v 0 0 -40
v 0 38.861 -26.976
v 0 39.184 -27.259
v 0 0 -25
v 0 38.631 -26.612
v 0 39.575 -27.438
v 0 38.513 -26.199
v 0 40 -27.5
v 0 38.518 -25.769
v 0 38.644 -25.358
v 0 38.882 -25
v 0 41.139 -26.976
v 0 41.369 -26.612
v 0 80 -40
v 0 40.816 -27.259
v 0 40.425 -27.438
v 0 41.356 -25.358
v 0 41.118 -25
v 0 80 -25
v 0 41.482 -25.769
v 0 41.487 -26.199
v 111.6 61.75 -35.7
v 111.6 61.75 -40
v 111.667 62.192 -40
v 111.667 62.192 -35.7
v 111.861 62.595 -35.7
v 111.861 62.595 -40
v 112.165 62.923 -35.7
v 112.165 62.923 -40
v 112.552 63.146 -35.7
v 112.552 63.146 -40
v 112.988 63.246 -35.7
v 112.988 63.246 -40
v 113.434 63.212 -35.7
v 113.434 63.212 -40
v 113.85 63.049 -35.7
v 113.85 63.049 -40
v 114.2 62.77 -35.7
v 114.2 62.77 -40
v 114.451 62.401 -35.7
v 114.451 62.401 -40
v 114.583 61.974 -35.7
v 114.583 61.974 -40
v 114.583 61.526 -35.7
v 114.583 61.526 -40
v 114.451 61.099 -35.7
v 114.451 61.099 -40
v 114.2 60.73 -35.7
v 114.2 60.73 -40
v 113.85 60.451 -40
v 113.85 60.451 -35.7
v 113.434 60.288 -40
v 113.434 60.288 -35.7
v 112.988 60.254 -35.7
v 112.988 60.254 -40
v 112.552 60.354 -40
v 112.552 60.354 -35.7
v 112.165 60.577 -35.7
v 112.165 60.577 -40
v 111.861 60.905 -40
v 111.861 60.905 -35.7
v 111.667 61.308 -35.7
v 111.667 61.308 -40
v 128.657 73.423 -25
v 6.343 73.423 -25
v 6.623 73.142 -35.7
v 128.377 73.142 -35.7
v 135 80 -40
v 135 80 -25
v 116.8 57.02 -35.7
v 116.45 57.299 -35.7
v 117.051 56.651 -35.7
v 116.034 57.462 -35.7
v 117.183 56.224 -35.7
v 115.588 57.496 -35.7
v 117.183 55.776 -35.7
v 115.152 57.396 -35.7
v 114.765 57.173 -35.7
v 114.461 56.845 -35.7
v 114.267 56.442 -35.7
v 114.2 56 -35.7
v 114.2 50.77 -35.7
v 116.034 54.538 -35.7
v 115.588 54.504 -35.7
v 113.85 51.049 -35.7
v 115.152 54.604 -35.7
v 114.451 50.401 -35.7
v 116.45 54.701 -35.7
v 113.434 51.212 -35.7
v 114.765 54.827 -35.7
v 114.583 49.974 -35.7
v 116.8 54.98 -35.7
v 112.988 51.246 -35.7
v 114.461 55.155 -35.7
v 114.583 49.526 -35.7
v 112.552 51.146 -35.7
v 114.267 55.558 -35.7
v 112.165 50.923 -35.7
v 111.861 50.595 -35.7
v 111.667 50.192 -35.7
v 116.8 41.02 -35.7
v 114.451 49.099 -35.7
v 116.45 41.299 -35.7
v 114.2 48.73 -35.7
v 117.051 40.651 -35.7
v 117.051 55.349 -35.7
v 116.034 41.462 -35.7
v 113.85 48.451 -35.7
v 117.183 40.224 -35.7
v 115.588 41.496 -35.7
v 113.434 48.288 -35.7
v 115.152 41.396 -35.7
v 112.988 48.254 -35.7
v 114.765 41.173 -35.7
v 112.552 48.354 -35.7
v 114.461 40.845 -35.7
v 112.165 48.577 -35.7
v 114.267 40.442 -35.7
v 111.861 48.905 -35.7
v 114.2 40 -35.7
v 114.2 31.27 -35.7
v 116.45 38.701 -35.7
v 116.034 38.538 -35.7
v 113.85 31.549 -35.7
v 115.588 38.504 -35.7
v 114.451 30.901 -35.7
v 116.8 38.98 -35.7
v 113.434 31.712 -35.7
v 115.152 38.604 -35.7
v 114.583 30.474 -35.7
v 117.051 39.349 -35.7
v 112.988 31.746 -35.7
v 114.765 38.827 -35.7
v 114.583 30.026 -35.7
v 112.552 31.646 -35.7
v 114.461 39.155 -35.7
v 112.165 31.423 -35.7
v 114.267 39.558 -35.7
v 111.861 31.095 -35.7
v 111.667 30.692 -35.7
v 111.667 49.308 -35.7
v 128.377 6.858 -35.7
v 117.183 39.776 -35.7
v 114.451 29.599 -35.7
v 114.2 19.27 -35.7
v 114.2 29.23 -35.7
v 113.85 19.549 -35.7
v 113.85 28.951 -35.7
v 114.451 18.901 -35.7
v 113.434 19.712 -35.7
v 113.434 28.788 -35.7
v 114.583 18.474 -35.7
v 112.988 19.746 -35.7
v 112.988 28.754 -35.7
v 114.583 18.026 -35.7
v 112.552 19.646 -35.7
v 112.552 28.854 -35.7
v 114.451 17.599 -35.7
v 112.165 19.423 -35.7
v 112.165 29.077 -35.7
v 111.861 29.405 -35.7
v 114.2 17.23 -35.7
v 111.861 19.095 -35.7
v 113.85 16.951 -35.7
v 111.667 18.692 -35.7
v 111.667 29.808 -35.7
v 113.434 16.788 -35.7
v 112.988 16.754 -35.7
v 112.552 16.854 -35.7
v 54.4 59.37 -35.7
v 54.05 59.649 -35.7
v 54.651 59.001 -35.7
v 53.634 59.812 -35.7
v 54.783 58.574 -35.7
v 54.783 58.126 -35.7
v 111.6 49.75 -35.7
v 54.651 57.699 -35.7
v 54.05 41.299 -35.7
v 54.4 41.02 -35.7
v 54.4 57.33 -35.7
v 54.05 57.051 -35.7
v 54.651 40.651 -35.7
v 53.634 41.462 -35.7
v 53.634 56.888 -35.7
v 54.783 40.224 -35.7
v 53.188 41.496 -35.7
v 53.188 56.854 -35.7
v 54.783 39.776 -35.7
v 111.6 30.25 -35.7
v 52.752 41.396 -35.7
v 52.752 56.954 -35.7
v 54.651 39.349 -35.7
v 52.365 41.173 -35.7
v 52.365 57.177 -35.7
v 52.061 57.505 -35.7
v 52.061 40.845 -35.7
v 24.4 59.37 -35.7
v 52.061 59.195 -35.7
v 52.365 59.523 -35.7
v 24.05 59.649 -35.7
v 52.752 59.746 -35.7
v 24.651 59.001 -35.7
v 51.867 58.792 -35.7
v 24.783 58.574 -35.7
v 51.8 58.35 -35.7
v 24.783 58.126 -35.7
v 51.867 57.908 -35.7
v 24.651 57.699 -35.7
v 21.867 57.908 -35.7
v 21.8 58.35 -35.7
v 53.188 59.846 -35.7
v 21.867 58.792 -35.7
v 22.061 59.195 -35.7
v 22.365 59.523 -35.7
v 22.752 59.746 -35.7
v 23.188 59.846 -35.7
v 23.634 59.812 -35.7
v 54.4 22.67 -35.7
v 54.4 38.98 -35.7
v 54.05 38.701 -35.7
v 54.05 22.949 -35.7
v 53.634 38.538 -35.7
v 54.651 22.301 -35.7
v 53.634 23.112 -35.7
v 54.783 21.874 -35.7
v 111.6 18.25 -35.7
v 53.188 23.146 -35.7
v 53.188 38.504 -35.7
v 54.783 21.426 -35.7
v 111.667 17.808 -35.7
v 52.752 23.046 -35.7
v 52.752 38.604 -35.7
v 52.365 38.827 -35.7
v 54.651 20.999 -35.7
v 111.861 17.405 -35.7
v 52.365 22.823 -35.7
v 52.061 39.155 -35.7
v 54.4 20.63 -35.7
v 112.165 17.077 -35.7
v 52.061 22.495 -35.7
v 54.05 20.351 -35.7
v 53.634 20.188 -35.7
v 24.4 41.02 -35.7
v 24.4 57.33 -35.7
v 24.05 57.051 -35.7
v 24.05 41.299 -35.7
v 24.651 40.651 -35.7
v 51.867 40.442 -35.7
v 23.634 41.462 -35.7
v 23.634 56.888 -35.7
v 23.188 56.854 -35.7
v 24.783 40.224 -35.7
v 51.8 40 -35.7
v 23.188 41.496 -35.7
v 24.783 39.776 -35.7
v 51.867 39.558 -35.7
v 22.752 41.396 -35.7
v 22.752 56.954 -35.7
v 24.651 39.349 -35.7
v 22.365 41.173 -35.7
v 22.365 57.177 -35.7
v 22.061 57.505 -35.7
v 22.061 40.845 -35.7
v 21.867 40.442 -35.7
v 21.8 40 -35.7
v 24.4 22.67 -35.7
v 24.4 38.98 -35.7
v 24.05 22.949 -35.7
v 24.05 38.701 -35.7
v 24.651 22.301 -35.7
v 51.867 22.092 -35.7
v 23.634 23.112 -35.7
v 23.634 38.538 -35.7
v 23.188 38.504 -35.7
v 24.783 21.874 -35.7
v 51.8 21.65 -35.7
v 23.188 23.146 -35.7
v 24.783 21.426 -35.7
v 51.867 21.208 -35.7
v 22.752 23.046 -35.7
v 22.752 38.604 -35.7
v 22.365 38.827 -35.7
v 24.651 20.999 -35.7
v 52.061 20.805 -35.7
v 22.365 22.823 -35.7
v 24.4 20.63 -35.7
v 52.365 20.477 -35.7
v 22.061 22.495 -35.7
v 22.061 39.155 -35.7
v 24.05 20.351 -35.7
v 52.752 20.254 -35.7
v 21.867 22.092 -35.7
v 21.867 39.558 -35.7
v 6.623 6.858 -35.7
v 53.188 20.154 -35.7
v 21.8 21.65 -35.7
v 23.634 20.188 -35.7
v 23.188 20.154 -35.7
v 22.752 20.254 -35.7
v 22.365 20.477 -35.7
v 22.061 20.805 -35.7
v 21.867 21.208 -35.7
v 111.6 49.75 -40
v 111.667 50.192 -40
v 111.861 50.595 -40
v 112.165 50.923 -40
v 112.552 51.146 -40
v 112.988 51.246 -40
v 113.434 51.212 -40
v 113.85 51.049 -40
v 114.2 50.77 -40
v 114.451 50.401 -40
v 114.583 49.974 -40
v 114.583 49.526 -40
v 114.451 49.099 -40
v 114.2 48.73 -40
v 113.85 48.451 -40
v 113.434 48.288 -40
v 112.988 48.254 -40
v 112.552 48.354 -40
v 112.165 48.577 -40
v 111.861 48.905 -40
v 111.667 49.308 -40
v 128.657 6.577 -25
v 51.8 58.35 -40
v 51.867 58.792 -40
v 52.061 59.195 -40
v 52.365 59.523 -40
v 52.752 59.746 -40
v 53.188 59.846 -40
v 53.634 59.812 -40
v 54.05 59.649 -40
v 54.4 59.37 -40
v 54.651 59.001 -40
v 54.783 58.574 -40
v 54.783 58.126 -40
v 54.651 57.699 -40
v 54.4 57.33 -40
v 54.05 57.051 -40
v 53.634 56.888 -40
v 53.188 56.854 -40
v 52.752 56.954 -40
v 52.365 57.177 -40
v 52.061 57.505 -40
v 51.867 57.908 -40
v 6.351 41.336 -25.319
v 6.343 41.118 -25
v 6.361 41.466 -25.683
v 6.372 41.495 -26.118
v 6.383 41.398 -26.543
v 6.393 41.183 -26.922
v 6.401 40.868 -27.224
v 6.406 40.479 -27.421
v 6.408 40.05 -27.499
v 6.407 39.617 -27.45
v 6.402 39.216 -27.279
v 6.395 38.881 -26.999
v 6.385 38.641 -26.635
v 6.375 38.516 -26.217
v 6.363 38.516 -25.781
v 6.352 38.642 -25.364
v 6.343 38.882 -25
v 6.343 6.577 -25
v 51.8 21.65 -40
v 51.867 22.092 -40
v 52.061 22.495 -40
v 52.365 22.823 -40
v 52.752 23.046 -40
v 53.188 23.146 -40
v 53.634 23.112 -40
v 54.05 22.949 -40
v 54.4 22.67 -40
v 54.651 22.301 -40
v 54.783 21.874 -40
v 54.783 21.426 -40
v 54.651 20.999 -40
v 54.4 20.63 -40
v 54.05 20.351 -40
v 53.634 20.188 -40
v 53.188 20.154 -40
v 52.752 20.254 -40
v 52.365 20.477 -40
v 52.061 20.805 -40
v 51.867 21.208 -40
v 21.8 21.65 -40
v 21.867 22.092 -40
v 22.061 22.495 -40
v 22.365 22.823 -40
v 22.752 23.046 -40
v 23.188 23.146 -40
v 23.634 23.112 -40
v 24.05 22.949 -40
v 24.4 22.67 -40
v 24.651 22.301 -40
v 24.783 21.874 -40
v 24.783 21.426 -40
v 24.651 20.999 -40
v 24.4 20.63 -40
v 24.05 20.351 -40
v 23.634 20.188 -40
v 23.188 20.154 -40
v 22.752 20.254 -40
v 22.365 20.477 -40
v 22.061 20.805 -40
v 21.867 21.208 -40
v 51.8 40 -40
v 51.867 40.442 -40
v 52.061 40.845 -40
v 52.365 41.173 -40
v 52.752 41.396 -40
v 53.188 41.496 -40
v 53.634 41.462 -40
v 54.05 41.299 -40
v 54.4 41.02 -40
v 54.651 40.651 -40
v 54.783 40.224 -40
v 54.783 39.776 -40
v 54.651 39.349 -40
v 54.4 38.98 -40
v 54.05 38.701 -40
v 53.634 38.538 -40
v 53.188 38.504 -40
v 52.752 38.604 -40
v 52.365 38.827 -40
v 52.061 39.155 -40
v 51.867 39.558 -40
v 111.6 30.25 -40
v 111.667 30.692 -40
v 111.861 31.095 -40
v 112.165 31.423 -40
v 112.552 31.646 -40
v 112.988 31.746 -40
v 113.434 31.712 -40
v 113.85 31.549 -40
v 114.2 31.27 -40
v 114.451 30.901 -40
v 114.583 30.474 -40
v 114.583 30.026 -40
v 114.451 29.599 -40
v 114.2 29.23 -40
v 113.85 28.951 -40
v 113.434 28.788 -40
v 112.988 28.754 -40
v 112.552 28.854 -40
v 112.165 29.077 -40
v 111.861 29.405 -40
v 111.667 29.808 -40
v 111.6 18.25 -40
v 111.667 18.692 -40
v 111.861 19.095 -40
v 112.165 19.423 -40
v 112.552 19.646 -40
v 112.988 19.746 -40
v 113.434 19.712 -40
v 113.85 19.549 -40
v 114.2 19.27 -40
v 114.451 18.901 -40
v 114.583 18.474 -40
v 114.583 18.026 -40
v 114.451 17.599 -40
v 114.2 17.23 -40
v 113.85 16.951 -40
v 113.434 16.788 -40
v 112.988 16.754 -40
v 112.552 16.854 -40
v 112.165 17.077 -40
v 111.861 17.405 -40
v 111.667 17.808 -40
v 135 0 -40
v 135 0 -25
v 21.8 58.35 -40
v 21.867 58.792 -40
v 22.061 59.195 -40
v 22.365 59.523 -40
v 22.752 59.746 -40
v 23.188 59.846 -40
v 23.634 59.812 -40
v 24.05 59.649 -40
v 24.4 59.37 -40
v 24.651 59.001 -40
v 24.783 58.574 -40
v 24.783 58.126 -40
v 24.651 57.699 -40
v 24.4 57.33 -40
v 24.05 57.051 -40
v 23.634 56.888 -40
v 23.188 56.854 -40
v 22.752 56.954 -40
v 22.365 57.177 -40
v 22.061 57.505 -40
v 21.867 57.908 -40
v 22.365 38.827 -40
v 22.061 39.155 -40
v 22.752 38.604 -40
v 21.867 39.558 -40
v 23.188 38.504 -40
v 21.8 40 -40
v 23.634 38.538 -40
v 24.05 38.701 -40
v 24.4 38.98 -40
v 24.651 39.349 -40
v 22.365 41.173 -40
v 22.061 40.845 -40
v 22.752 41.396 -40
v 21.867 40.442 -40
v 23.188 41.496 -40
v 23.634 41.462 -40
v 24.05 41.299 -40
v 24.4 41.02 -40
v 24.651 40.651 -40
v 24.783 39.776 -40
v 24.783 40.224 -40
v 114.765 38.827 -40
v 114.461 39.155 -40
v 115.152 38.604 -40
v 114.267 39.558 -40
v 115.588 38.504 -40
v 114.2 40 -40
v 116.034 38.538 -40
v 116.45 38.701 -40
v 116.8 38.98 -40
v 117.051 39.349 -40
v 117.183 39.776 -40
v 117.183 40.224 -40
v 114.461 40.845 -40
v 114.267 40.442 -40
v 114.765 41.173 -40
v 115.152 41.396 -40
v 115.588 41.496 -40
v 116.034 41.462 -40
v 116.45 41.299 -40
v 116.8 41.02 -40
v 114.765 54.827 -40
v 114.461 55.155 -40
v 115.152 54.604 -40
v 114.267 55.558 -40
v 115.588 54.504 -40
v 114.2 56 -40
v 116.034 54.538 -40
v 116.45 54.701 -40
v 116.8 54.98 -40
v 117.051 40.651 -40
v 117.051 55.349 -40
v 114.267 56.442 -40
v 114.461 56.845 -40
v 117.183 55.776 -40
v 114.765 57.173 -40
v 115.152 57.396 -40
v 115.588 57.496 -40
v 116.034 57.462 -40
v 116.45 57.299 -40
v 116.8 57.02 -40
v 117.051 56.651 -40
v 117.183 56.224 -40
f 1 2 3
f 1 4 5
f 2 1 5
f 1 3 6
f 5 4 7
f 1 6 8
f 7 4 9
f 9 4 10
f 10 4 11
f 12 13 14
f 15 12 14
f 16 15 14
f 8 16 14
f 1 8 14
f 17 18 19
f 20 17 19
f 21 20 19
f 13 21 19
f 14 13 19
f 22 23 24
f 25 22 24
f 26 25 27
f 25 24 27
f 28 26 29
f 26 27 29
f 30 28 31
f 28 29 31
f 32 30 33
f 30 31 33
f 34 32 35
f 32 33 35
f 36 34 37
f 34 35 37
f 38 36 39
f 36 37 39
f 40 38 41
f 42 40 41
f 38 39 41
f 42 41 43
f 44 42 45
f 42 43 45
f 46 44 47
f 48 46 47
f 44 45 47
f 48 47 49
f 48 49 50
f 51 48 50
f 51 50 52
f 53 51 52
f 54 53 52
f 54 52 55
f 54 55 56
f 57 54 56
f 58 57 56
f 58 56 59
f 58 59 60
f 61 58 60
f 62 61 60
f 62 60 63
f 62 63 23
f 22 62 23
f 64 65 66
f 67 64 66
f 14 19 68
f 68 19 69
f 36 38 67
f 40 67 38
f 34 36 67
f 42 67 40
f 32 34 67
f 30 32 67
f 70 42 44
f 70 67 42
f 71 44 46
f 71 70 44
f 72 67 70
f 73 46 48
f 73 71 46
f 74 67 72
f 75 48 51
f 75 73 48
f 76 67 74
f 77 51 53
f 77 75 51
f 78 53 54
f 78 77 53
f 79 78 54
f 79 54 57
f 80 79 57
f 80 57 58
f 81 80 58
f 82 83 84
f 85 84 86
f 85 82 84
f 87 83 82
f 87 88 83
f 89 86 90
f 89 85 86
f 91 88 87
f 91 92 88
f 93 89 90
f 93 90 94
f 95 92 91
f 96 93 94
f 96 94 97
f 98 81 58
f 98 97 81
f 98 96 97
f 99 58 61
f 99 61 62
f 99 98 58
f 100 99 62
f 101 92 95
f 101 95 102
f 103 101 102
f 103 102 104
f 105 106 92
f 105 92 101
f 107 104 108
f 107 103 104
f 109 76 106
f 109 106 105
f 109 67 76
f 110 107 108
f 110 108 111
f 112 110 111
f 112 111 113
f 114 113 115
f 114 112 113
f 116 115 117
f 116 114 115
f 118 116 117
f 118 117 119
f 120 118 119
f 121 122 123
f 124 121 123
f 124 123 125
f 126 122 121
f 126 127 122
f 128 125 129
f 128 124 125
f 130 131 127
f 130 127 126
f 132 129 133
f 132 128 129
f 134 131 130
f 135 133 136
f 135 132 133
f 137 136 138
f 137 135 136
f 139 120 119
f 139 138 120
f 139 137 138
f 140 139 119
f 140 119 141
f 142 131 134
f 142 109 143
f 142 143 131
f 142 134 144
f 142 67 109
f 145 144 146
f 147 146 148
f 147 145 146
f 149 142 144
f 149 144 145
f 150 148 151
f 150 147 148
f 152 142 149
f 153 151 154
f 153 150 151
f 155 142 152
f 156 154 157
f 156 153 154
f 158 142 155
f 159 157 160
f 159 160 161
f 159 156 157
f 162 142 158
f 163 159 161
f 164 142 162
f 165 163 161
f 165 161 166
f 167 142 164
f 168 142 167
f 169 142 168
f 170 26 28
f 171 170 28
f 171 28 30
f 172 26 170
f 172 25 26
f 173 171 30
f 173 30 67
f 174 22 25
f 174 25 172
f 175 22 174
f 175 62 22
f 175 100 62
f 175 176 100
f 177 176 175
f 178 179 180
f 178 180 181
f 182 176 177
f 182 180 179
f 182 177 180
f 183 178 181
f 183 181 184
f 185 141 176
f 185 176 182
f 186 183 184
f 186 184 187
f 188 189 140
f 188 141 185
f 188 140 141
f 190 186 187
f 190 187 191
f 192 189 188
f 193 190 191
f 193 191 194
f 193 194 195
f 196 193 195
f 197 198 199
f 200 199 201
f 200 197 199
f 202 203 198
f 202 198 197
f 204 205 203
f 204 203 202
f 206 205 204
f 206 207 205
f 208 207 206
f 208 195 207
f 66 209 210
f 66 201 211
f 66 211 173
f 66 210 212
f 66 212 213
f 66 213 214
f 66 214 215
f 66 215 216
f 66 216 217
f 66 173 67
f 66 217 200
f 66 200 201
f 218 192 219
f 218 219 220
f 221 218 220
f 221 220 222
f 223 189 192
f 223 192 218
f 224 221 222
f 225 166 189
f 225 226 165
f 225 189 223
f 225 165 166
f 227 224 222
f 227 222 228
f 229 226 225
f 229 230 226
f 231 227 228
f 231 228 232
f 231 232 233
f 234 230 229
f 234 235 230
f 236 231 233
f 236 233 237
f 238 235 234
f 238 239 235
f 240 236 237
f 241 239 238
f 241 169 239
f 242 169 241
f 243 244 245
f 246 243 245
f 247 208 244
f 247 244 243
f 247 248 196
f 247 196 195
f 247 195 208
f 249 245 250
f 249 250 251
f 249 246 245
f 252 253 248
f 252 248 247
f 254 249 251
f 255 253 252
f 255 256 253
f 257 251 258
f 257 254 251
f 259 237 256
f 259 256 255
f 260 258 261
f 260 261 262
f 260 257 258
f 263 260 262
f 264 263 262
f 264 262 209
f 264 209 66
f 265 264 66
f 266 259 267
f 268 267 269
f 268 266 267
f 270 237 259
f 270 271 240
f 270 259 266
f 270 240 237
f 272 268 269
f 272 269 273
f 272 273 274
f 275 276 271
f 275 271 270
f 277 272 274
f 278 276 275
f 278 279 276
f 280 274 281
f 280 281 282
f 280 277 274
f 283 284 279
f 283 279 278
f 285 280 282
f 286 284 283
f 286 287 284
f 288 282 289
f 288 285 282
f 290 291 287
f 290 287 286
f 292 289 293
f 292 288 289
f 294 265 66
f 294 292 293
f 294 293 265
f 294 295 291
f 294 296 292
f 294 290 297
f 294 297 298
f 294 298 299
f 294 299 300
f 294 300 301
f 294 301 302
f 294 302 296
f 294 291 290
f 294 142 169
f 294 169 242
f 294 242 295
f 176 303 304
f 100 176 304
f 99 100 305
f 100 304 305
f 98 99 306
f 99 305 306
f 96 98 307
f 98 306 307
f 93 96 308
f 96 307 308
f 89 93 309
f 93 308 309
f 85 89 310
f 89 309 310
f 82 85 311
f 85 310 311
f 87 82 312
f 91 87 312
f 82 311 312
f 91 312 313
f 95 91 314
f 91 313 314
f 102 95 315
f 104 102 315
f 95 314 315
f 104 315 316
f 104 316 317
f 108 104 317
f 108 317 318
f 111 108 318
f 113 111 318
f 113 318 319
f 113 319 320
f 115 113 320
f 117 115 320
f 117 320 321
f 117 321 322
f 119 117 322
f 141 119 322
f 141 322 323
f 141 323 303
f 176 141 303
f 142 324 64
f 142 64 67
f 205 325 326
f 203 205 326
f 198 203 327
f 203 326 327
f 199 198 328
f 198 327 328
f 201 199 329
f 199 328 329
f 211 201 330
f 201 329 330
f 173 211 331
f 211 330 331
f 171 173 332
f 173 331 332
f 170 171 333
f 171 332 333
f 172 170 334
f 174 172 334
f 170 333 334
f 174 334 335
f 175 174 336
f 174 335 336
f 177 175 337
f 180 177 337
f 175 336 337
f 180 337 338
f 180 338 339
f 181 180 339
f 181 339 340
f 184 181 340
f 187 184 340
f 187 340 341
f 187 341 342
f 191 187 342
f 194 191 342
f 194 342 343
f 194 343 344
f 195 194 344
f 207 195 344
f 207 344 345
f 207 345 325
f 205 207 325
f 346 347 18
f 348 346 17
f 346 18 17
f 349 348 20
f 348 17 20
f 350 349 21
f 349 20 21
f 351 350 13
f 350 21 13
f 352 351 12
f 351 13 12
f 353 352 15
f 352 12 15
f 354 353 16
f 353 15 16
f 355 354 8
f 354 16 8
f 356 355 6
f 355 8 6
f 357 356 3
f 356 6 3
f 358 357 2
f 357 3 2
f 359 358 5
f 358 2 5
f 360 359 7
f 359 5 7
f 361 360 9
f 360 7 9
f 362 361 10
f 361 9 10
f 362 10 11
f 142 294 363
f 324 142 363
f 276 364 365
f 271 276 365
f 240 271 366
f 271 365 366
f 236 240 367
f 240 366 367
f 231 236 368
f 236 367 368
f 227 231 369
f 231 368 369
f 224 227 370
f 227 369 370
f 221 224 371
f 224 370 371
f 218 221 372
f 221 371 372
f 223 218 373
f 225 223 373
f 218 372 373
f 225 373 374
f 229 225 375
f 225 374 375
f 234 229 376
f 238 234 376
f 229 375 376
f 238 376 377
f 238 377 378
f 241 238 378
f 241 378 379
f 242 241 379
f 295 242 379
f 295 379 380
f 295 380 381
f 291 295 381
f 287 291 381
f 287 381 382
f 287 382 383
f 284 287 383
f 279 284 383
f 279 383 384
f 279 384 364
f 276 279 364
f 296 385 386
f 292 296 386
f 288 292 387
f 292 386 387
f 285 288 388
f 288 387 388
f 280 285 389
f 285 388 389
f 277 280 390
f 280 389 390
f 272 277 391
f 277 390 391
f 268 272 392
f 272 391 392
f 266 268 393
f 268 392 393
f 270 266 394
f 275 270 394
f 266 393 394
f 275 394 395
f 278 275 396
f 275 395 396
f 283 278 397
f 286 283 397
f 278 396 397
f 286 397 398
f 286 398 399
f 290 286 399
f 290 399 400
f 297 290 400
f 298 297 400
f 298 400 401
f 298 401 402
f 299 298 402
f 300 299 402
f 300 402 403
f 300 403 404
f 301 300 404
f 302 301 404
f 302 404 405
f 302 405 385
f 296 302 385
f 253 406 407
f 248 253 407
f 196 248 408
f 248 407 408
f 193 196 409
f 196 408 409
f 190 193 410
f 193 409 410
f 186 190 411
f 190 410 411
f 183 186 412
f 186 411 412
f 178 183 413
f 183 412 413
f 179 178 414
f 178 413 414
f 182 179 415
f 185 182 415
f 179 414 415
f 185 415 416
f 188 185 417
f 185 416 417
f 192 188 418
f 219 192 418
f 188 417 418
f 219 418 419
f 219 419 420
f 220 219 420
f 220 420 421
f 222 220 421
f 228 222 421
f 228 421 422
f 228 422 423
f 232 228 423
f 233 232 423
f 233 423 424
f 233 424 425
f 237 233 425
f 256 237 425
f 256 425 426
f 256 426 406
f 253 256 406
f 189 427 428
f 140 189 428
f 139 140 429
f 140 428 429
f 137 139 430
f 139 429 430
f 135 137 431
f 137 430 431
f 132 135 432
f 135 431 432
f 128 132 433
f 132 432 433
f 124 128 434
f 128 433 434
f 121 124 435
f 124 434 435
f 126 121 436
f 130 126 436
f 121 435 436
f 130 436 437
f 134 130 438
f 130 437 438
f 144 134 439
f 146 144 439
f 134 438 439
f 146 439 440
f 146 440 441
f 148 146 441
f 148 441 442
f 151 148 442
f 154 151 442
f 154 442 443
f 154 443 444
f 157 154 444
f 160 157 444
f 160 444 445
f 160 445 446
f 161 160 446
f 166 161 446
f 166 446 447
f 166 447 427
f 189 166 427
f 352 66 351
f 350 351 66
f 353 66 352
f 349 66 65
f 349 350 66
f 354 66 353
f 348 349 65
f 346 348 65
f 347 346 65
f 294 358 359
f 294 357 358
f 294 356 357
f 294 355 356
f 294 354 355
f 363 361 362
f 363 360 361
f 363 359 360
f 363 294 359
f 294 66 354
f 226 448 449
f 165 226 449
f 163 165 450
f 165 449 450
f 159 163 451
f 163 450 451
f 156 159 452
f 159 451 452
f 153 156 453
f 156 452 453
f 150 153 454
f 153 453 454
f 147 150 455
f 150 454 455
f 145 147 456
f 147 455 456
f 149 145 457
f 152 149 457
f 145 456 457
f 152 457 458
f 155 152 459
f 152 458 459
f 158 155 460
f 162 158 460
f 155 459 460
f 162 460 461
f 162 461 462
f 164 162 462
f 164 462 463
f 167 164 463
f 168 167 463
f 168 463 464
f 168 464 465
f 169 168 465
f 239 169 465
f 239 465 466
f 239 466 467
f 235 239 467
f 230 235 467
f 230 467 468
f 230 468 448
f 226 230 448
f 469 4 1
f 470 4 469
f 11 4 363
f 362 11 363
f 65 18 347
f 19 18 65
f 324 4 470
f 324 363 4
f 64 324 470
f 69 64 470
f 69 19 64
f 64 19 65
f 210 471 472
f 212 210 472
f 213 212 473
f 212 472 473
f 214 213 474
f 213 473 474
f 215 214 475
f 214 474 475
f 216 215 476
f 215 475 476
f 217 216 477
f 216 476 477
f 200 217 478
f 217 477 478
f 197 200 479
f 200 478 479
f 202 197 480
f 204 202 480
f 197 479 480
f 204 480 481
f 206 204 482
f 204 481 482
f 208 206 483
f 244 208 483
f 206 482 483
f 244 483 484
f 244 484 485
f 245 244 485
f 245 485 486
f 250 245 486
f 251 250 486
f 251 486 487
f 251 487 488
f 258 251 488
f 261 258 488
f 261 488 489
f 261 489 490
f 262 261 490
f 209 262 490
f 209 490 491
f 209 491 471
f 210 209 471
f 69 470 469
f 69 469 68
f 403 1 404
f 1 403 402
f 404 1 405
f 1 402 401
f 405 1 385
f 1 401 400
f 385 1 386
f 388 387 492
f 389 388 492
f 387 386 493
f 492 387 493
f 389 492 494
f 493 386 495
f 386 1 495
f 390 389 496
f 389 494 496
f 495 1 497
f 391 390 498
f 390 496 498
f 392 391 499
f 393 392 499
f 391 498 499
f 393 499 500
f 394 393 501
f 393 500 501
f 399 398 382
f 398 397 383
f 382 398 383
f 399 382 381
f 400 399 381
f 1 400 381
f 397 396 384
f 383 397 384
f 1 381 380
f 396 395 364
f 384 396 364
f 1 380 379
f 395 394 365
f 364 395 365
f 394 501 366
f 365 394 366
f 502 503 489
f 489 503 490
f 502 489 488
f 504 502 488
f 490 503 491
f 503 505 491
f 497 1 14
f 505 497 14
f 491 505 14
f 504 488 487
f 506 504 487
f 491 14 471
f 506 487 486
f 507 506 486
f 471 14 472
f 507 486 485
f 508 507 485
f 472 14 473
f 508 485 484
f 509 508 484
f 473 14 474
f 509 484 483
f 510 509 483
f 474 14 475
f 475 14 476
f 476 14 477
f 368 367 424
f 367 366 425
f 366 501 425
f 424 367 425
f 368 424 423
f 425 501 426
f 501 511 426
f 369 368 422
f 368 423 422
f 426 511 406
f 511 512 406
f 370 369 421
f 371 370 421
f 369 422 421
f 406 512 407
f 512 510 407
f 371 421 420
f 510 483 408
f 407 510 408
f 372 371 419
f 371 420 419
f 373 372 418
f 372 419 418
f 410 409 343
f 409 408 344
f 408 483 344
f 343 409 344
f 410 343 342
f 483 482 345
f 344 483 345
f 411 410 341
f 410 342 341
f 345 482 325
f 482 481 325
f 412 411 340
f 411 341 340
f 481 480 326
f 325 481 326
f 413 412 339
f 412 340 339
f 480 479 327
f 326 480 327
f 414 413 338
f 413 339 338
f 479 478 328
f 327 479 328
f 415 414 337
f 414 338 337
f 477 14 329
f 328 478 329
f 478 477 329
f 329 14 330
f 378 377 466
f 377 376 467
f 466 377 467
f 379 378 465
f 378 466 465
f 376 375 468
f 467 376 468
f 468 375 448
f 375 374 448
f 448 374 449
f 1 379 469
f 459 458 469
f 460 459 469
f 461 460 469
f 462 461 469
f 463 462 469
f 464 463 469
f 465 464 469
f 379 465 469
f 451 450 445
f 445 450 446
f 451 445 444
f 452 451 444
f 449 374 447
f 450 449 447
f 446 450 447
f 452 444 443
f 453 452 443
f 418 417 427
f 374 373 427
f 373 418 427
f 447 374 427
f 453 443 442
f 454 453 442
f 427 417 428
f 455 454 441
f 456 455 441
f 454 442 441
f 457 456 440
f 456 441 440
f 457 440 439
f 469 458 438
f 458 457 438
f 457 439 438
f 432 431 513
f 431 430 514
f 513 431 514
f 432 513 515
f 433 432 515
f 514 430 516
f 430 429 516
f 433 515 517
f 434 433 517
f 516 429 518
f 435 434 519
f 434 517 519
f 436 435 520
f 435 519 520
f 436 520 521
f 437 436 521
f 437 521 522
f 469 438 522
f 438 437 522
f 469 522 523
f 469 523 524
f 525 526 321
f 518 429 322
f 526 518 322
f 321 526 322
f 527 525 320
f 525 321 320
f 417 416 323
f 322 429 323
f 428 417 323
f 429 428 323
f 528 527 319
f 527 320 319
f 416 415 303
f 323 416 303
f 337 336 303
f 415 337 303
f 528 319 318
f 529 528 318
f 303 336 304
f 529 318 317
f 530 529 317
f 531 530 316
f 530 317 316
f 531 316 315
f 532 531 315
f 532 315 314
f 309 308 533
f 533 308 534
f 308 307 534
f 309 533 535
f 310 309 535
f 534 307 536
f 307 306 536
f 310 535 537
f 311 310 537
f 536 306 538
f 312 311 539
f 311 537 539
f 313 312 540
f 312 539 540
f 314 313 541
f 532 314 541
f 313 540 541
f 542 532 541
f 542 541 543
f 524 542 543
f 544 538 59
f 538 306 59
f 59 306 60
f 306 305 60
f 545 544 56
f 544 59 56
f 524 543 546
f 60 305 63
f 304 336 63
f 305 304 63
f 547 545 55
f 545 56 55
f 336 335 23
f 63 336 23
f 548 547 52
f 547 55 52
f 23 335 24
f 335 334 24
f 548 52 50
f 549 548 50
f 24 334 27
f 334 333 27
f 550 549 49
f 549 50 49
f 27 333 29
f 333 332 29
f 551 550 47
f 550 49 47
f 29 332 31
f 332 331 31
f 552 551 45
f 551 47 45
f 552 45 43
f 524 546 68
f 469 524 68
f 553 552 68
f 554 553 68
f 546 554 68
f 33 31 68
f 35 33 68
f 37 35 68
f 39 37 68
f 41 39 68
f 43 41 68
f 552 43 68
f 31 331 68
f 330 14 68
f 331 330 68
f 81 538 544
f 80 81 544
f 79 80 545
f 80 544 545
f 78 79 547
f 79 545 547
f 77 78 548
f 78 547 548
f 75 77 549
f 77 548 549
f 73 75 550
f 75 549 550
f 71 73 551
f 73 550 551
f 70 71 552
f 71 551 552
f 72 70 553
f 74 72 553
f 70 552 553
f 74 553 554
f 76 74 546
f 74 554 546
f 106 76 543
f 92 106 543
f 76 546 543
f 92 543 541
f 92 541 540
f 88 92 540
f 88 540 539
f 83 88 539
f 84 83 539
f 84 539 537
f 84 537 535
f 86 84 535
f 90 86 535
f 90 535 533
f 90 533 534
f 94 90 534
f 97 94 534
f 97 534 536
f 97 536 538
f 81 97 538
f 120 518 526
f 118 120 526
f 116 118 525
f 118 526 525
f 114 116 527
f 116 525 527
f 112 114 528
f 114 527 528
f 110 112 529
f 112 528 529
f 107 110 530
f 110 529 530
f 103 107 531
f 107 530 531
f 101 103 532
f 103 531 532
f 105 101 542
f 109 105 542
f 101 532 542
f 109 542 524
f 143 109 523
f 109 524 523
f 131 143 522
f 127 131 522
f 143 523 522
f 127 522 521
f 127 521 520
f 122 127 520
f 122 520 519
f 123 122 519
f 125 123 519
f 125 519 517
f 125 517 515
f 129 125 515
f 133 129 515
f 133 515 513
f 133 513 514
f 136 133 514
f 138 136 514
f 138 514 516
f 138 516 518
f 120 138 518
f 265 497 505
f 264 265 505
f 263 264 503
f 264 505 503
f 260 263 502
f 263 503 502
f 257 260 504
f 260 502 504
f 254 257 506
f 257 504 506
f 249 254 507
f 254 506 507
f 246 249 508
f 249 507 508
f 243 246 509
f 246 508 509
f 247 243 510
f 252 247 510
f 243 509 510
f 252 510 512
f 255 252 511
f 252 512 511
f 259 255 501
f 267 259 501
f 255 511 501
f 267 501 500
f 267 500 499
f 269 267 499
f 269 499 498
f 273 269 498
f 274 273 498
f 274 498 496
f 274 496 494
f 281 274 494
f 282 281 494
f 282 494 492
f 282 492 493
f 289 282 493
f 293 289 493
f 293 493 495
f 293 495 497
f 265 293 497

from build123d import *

# Parameters (mm, degrees)
SKETCH1_W           = 135
SKETCH1_H           = 80
BOSS_EXTRUDE1_DEPTH = 40
SKETCH2_R           = 1.5
CUT_EXTRUDE1_DEPTH  = 10
SKETCH3_R           = 1.5
CUT_EXTRUDE2_DEPTH  = 10
CAVITY1_START       = 5.91875
CAVITY1_DEPTH       = 68.1625
CAVITY1_START_2     = 5
CAVITY1_2_DEPTH     = 125
SKETCH4_W           = 135
SKETCH4_H           = 25
CUT_EXTRUDE3_DEPTH  = 100


with BuildPart() as part:
    # Sketch1 → Boss-Extrude1 (new body)
    with BuildSketch(Plane.XY):
        with Locations((67.5, 40)):
            Rectangle(SKETCH1_W, SKETCH1_H)
    extrude(amount=-BOSS_EXTRUDE1_DEPTH)

    # Sketch2 → Cut-Extrude1 (cut)
    with BuildSketch(Plane(origin=(0, 0, -40), x_dir=(-1, 0, 0), z_dir=(0, 0, -1))):
        with Locations((-53.3, 40)):
            Circle(SKETCH2_R)
        with Locations((-53.3, 58.35)):
            Circle(SKETCH2_R)
        with Locations((-53.3, 21.65)):
            Circle(SKETCH2_R)
        with Locations((-23.3, 58.35)):
            Circle(SKETCH2_R)
        with Locations((-23.3, 40)):
            Circle(SKETCH2_R)
        with Locations((-23.3, 21.65)):
            Circle(SKETCH2_R)
        with Locations((-115.7, 40)):
            Circle(SKETCH2_R)
        with Locations((-115.7, 56)):
            Circle(SKETCH2_R)
        with Locations((-113.1, 61.75)):
            Circle(SKETCH2_R)
        with Locations((-113.1, 49.75)):
            Circle(SKETCH2_R)
        with Locations((-113.1, 18.25)):
            Circle(SKETCH2_R)
        with Locations((-113.1, 30.25)):
            Circle(SKETCH2_R)
    extrude(amount=-CUT_EXTRUDE1_DEPTH, mode=Mode.SUBTRACT)

    # Sketch3 → Cut-Extrude2 (cut)
    with BuildSketch(Plane.ZY):
        with Locations((-10, 54.05)):
            Circle(SKETCH3_R)
        with Locations((-10, 25.95)):
            Circle(SKETCH3_R)
        with Locations((-26, 40)):
            Circle(SKETCH3_R)
    extrude(amount=-CUT_EXTRUDE2_DEPTH, mode=Mode.SUBTRACT)

    # Cavity1: read off the stored shape, not the designer's step
    # Cavity1 outline → Cavity1 (cut)
    with BuildSketch(Plane(origin=(0, 0, 0), x_dir=(1, 0, 0), z_dir=(0, 1, 0)).offset(CAVITY1_START)):
        Polygon((128.3771626, 35.7), (6.6228374, 35.7), (5.688, 0), (129.312, 0), align=None)
    extrude(amount=CAVITY1_DEPTH, mode=Mode.SUBTRACT)

    # Cavity1 2 outline → Cavity1 2 (add)
    with BuildSketch(Plane.YZ.offset(CAVITY1_START_2)):
        Polygon((74.08125, 0), (73.141830064, -35.7), (74.08125, -35.7), align=None)
        Polygon((6.858169936, -35.7), (5.91875, 0), (5.91875, -35.7), align=None)
    extrude(amount=CAVITY1_2_DEPTH)

    # Sketch4 → Cut-Extrude3 (cut)
    with BuildSketch(Plane(origin=(0, 80, 0), x_dir=(1, 0, 0), z_dir=(0, 1, 0))):
        with Locations((67.5, 12.5)):
            Rectangle(SKETCH4_W, SKETCH4_H)
    extrude(amount=-CUT_EXTRUDE3_DEPTH, mode=Mode.SUBTRACT)


solid = part.part
